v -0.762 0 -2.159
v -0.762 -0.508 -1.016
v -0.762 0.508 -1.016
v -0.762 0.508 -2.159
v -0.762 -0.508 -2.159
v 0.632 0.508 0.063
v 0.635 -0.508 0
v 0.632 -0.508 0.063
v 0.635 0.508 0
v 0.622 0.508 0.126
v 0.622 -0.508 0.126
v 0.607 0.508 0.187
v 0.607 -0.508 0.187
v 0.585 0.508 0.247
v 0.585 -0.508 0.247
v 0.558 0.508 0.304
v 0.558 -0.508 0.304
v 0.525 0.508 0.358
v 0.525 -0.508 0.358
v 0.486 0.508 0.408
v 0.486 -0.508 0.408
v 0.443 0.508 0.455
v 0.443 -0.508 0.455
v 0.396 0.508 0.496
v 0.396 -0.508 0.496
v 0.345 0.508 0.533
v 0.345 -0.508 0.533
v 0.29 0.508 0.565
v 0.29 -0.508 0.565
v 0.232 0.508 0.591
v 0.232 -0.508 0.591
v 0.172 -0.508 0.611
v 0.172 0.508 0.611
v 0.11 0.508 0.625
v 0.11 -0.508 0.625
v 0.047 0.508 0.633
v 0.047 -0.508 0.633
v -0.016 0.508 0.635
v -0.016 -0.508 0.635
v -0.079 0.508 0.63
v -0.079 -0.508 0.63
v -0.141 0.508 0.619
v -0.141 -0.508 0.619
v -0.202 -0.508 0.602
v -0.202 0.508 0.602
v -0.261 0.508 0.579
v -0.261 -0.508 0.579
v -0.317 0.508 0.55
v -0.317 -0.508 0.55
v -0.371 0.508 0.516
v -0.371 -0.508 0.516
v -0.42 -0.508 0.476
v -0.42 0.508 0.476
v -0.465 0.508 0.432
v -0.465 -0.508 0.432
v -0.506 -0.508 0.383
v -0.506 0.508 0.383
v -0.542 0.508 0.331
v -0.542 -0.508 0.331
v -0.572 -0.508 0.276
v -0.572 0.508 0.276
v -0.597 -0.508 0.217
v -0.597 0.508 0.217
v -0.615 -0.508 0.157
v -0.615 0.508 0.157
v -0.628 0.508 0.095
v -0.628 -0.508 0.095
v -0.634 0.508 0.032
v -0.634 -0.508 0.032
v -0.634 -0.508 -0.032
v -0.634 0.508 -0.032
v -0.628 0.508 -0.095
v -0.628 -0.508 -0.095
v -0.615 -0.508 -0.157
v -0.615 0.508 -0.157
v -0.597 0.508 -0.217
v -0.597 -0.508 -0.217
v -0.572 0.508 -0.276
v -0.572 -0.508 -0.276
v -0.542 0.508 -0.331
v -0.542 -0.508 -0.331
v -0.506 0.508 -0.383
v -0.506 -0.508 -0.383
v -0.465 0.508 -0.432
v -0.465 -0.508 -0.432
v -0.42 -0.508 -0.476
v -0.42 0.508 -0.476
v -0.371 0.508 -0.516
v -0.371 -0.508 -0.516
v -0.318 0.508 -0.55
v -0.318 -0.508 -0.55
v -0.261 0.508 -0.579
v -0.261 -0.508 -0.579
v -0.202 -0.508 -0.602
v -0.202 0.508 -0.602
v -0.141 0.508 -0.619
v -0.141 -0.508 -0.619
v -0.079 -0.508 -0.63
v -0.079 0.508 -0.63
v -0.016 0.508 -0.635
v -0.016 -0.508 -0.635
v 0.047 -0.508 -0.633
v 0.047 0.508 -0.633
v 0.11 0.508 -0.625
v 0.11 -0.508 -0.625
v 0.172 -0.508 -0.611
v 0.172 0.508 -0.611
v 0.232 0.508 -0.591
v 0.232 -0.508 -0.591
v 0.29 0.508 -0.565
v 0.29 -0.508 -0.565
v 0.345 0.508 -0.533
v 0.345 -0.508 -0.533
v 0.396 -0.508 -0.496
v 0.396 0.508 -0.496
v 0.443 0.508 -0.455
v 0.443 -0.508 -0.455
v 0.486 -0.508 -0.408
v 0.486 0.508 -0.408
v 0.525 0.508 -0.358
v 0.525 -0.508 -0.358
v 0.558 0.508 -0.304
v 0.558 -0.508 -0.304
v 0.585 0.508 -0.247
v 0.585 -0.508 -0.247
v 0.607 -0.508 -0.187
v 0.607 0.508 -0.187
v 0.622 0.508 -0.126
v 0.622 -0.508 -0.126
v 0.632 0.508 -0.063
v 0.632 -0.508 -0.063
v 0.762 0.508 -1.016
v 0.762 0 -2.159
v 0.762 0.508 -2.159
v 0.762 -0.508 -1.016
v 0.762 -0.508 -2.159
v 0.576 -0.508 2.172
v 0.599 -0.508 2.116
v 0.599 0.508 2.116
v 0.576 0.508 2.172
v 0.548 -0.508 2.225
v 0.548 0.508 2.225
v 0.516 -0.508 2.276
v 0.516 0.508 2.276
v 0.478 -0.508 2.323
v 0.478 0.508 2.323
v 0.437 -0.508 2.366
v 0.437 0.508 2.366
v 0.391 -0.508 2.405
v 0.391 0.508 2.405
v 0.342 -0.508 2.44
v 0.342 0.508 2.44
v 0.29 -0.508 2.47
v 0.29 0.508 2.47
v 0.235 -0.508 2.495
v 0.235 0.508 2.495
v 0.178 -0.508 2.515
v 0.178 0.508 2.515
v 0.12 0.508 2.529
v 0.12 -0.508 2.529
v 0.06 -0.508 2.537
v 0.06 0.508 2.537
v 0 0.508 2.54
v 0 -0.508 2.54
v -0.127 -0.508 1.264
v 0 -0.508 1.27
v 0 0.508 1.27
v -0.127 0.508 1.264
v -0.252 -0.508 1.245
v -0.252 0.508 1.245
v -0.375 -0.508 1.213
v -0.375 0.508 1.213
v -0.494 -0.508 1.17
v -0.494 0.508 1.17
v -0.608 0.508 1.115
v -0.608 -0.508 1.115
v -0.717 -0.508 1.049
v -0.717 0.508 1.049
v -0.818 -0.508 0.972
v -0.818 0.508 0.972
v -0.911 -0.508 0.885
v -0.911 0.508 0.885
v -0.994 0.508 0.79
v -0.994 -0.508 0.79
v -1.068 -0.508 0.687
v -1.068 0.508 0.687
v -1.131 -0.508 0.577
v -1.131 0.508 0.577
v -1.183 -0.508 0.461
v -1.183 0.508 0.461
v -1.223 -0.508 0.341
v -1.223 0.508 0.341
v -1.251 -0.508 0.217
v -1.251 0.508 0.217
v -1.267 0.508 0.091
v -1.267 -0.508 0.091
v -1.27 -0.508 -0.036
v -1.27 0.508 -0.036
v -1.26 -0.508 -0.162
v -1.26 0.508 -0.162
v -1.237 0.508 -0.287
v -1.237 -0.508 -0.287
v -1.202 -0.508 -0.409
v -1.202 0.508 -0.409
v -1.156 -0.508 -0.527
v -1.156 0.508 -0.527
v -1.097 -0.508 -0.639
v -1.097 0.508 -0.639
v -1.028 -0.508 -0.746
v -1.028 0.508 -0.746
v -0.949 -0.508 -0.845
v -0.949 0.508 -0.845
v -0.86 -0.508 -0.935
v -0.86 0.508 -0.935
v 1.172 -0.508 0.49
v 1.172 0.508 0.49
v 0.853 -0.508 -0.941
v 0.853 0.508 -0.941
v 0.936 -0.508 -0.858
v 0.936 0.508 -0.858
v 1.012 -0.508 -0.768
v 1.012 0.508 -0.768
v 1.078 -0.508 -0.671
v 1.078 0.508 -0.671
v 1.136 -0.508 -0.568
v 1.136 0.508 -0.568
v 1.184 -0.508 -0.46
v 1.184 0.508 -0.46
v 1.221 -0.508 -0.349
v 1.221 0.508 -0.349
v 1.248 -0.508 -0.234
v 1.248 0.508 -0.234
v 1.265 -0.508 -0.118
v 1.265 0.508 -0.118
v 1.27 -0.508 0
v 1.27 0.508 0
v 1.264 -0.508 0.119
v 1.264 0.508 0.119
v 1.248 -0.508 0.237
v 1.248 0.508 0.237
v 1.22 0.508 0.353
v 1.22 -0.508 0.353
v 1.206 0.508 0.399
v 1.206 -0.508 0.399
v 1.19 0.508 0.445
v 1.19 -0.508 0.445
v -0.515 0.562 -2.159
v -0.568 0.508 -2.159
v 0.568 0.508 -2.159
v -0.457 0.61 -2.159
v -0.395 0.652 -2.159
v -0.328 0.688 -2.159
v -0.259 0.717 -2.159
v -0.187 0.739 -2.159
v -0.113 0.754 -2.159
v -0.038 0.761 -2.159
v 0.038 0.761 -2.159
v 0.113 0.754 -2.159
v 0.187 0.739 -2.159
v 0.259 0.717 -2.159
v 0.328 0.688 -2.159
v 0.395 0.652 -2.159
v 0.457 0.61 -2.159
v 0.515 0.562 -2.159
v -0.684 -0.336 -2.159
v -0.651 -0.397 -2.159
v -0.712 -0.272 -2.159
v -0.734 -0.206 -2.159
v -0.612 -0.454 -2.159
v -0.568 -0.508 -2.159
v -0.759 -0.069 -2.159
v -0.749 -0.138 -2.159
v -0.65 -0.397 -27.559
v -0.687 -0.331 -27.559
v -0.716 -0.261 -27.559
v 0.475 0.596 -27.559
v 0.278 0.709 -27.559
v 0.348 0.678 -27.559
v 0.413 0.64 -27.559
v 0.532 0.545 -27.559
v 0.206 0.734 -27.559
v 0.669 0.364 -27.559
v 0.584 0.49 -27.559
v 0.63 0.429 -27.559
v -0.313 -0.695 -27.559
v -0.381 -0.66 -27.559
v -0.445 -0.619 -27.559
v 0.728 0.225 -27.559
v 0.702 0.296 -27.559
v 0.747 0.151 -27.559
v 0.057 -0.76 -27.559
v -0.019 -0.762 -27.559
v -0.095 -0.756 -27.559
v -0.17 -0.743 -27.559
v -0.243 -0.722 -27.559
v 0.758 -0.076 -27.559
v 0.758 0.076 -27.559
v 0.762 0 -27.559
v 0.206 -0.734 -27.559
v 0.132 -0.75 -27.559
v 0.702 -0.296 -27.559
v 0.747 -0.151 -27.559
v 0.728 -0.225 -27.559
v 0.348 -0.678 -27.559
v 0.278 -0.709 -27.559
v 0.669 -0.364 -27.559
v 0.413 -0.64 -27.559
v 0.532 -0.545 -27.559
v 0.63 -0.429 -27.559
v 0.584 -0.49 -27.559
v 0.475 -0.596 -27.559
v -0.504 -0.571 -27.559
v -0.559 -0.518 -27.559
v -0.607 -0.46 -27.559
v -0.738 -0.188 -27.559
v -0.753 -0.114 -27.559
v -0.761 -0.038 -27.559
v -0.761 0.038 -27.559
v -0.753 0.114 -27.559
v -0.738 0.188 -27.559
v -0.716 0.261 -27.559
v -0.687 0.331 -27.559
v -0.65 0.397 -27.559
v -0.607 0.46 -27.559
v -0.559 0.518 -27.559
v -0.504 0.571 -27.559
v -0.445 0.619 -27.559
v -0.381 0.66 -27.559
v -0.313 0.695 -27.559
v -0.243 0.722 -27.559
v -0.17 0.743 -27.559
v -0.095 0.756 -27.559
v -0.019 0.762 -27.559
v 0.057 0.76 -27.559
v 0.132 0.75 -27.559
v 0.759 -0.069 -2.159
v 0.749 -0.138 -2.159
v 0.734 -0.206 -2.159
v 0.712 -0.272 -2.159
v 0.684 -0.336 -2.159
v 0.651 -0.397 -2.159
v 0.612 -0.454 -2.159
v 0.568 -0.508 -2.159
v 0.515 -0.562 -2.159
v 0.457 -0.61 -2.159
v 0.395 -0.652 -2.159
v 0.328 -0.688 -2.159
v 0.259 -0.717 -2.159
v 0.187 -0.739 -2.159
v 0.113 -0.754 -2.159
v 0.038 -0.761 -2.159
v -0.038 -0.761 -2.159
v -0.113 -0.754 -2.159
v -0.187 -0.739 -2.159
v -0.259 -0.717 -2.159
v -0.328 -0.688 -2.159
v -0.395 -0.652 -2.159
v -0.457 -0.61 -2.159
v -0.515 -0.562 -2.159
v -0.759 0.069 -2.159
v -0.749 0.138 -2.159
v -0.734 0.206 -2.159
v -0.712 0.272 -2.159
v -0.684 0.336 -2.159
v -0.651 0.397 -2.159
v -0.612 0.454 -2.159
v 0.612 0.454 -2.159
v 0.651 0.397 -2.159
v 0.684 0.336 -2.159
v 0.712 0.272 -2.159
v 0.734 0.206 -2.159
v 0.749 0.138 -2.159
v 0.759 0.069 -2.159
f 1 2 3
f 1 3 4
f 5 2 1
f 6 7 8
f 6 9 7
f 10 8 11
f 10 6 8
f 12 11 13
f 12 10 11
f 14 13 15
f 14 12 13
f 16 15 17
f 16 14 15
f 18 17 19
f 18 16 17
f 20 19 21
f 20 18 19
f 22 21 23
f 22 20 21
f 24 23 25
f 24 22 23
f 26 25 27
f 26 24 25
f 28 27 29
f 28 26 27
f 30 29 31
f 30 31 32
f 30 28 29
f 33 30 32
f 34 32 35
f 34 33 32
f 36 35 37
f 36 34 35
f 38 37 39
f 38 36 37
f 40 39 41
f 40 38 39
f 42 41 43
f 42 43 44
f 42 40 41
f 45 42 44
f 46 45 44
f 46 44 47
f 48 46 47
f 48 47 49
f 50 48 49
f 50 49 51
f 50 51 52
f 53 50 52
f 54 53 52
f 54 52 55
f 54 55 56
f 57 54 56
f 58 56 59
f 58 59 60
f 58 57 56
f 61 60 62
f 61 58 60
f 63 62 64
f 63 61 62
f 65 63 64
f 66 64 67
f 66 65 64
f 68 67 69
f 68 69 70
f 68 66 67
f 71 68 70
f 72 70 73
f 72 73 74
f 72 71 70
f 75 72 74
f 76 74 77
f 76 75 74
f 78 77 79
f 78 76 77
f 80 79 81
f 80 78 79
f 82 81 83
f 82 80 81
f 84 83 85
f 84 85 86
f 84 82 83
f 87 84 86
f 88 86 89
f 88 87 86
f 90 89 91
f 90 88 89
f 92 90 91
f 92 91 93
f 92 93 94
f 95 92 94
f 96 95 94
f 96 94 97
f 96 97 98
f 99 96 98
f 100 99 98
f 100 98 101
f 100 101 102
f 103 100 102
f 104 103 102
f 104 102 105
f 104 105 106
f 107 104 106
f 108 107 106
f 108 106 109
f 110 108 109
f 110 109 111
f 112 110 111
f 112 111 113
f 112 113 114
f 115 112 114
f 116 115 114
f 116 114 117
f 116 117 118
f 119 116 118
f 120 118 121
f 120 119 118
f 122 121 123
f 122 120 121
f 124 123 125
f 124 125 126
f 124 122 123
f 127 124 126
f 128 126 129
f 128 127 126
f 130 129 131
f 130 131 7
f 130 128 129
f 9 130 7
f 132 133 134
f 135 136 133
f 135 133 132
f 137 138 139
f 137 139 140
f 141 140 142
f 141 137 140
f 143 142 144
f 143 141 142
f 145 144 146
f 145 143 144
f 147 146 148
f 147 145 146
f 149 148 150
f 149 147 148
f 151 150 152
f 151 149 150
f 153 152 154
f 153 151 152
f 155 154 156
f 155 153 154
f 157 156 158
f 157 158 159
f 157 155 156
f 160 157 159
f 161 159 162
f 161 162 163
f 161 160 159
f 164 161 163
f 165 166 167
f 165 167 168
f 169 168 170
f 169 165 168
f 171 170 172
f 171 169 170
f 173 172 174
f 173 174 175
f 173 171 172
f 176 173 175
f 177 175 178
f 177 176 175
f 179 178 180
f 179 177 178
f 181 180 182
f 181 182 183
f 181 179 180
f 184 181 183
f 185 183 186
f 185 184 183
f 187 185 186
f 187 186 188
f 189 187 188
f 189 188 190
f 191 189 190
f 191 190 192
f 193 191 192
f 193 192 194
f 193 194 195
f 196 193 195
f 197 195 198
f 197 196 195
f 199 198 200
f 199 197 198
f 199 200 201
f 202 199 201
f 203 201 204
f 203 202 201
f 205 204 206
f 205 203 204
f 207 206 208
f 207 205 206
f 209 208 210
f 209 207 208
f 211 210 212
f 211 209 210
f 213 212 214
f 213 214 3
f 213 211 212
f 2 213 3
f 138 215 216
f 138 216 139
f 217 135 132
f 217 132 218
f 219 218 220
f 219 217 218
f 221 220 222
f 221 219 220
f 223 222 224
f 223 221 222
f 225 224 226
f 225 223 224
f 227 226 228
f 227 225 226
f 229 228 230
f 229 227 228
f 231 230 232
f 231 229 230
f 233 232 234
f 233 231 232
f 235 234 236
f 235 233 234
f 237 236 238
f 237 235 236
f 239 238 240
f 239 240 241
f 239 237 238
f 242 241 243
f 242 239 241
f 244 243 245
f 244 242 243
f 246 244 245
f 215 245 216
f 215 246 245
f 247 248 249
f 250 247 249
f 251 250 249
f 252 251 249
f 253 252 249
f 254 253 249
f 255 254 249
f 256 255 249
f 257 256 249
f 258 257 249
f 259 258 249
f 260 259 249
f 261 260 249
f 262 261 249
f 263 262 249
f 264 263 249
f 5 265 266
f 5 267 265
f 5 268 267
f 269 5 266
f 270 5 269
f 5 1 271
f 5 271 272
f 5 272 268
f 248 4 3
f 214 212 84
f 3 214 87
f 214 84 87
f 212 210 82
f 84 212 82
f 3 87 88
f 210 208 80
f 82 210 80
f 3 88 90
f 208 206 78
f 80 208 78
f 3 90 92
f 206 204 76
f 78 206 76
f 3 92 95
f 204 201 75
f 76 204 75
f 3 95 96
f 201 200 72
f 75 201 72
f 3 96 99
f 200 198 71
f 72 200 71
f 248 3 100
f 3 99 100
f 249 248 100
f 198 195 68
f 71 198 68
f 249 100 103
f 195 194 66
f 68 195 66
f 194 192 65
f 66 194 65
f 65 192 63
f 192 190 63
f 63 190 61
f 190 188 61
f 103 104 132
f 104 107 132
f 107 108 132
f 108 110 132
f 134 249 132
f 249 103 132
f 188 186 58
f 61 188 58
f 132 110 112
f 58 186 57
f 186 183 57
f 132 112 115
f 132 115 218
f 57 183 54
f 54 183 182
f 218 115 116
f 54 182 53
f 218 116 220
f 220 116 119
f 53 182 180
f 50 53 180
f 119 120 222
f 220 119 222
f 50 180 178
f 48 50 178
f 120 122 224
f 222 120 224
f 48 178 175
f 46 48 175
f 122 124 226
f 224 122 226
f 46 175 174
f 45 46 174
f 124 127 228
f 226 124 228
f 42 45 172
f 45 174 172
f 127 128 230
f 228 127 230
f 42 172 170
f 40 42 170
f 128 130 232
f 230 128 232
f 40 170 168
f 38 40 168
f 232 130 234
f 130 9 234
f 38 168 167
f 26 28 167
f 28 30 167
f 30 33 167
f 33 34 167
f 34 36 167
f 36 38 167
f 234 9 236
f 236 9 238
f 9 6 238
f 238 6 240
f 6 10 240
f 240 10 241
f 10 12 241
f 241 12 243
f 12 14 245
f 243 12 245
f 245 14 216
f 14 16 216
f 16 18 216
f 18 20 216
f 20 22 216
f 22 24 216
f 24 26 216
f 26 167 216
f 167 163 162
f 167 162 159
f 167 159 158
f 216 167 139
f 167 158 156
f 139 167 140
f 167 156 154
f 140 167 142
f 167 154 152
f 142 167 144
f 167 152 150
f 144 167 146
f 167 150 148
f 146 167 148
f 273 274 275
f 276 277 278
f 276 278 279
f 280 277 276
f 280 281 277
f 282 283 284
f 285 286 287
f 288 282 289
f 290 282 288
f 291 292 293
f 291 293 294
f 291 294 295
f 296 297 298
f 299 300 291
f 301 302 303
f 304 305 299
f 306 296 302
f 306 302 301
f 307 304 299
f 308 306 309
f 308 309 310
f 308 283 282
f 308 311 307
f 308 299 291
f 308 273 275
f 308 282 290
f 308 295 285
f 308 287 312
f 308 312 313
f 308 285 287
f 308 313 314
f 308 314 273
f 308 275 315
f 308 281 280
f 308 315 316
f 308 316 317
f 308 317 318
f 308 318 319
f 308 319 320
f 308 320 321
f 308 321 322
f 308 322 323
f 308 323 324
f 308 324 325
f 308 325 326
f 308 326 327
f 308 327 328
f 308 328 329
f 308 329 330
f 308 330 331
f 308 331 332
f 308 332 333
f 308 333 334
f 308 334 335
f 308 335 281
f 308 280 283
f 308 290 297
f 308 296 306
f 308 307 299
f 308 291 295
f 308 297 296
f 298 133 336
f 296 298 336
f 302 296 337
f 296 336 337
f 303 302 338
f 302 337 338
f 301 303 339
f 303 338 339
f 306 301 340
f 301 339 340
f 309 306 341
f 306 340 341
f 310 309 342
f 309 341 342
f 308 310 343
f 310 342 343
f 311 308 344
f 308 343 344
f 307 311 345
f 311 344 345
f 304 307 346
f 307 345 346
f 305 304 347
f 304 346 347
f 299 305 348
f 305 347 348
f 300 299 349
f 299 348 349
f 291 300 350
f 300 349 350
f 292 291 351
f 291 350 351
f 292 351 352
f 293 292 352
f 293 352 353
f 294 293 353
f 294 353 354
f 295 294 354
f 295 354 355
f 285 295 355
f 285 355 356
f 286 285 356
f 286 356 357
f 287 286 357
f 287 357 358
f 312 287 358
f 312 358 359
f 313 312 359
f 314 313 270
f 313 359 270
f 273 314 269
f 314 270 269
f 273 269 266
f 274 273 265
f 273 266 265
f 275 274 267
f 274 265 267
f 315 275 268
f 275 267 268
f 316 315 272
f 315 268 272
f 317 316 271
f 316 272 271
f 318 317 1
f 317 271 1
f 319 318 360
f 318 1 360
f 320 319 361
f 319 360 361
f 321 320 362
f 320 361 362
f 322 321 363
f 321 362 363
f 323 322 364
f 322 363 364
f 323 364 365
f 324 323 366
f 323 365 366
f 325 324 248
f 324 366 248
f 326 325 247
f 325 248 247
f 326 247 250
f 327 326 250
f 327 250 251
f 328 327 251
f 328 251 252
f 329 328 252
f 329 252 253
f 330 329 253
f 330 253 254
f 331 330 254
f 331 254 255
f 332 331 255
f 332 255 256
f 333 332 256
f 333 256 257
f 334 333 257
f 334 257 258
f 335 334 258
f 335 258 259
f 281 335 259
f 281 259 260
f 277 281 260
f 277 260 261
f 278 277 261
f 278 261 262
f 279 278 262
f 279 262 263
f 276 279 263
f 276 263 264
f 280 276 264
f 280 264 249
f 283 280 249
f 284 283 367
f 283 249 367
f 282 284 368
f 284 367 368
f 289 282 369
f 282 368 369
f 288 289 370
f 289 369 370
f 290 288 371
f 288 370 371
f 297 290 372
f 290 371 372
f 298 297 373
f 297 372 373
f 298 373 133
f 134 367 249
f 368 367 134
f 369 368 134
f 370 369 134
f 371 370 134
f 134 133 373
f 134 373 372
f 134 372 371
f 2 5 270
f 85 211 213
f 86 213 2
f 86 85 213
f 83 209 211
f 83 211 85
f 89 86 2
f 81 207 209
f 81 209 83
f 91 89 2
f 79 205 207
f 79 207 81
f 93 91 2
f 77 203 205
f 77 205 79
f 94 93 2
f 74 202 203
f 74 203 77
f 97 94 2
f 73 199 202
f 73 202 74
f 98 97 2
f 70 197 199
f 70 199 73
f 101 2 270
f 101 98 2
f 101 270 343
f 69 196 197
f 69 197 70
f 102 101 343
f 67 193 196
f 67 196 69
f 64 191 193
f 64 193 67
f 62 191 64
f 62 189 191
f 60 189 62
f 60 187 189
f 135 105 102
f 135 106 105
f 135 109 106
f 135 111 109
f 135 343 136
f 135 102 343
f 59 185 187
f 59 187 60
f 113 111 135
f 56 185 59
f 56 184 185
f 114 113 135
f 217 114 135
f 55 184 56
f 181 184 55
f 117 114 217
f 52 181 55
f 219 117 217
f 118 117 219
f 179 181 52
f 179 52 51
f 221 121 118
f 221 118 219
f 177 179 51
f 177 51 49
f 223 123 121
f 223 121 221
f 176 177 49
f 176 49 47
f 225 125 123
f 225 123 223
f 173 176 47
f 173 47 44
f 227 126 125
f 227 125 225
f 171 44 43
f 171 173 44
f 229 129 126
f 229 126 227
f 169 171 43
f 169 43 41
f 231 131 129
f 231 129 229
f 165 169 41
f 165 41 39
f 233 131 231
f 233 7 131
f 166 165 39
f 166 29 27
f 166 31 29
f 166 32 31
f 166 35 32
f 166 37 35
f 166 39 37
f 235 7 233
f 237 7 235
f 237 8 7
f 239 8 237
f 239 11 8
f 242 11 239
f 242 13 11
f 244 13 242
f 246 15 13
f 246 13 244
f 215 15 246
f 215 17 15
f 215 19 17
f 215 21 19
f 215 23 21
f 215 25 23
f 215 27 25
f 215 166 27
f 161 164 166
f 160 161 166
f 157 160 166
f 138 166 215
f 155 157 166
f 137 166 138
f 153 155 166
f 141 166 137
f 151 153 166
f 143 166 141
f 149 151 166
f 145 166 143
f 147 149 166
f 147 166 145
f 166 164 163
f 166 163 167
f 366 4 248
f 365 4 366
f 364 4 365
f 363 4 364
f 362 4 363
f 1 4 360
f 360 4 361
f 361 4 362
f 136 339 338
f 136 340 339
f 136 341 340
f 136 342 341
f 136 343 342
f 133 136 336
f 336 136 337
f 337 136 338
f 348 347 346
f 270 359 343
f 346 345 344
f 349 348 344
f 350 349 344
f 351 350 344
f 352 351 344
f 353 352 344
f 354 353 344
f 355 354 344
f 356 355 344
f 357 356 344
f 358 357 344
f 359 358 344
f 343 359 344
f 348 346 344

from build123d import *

# Parameters (mm, degrees)
F0_R     = 0.635
F1_DEPTH = 0.508
F2_DEPTH = 0.508
F3_R     = 0.762
F4_DEPTH = 25.4


with BuildPart() as f1:
    # F0 (on Front) → F1 (new body, symmetric)
    with BuildSketch(Plane.XZ):
        with BuildLine():
            Line((1.1718346045, 0.4895954042), (1.219972654, 0.352940113))
            ThreePointArc((1.219972654, 0.352940113), (1.1978539801, 0.4219547871), (1.1718346045, 0.4895954042))
        make_face()
        with BuildLine():
            ThreePointArc((0, 1.27), (0.7039580373, 1.0570445032), (1.1718346045, 0.4895954042))
            Line((1.1718346045, 0.4895954042), (0.59892699, 2.1159773936))
            ThreePointArc((0.59892699, 2.1159773936), (0.3669157635, 2.42326424), (0, 2.54))
            Line((0, 2.54), (0, 1.27))
        make_face()
        with BuildLine():
            ThreePointArc((0.762, -1.016), (1.1359225326, -0.5679612663), (1.27, 0))
            ThreePointArc((1.27, 0), (1.2574309664, 0.1782340166), (1.219972654, 0.352940113))
            Line((1.219972654, 0.352940113), (1.1718346045, 0.4895954042))
            ThreePointArc((1.1718346045, 0.4895954042), (0.7039580373, 1.0570445032), (0, 1.27))
            ThreePointArc((0, 1.27), (-1.2048277885, 0.4016092628), (-0.762, -1.016))
            ThreePointArc((-0.762, -1.016), (0, -1.27), (0.762, -1.016))
        make_face()
        Circle(F0_R, mode=Mode.SUBTRACT)
    extrude(amount=F1_DEPTH, both=True)

    # F0 (on Front) → F2 (join, symmetric)
    with BuildSketch(Plane.XZ):
        with BuildLine():
            Line((0.762, -2.159), (0.762, -1.016))
            ThreePointArc((0.762, -1.016), (0, -1.27), (-0.762, -1.016))
            Line((-0.762, -1.016), (-0.762, -2.159))
            Line((-0.762, -2.159), (0.762, -2.159))
        make_face()
    extrude(amount=F2_DEPTH, both=True)

    # F3 (on face) → F4 (join)
    with BuildSketch(Plane(origin=(0, 0, -2.159), x_dir=(1, 0, 0), z_dir=(0, 0, -1))):
        Circle(F3_R)
    extrude(amount=F4_DEPTH)


solid = f1.part
